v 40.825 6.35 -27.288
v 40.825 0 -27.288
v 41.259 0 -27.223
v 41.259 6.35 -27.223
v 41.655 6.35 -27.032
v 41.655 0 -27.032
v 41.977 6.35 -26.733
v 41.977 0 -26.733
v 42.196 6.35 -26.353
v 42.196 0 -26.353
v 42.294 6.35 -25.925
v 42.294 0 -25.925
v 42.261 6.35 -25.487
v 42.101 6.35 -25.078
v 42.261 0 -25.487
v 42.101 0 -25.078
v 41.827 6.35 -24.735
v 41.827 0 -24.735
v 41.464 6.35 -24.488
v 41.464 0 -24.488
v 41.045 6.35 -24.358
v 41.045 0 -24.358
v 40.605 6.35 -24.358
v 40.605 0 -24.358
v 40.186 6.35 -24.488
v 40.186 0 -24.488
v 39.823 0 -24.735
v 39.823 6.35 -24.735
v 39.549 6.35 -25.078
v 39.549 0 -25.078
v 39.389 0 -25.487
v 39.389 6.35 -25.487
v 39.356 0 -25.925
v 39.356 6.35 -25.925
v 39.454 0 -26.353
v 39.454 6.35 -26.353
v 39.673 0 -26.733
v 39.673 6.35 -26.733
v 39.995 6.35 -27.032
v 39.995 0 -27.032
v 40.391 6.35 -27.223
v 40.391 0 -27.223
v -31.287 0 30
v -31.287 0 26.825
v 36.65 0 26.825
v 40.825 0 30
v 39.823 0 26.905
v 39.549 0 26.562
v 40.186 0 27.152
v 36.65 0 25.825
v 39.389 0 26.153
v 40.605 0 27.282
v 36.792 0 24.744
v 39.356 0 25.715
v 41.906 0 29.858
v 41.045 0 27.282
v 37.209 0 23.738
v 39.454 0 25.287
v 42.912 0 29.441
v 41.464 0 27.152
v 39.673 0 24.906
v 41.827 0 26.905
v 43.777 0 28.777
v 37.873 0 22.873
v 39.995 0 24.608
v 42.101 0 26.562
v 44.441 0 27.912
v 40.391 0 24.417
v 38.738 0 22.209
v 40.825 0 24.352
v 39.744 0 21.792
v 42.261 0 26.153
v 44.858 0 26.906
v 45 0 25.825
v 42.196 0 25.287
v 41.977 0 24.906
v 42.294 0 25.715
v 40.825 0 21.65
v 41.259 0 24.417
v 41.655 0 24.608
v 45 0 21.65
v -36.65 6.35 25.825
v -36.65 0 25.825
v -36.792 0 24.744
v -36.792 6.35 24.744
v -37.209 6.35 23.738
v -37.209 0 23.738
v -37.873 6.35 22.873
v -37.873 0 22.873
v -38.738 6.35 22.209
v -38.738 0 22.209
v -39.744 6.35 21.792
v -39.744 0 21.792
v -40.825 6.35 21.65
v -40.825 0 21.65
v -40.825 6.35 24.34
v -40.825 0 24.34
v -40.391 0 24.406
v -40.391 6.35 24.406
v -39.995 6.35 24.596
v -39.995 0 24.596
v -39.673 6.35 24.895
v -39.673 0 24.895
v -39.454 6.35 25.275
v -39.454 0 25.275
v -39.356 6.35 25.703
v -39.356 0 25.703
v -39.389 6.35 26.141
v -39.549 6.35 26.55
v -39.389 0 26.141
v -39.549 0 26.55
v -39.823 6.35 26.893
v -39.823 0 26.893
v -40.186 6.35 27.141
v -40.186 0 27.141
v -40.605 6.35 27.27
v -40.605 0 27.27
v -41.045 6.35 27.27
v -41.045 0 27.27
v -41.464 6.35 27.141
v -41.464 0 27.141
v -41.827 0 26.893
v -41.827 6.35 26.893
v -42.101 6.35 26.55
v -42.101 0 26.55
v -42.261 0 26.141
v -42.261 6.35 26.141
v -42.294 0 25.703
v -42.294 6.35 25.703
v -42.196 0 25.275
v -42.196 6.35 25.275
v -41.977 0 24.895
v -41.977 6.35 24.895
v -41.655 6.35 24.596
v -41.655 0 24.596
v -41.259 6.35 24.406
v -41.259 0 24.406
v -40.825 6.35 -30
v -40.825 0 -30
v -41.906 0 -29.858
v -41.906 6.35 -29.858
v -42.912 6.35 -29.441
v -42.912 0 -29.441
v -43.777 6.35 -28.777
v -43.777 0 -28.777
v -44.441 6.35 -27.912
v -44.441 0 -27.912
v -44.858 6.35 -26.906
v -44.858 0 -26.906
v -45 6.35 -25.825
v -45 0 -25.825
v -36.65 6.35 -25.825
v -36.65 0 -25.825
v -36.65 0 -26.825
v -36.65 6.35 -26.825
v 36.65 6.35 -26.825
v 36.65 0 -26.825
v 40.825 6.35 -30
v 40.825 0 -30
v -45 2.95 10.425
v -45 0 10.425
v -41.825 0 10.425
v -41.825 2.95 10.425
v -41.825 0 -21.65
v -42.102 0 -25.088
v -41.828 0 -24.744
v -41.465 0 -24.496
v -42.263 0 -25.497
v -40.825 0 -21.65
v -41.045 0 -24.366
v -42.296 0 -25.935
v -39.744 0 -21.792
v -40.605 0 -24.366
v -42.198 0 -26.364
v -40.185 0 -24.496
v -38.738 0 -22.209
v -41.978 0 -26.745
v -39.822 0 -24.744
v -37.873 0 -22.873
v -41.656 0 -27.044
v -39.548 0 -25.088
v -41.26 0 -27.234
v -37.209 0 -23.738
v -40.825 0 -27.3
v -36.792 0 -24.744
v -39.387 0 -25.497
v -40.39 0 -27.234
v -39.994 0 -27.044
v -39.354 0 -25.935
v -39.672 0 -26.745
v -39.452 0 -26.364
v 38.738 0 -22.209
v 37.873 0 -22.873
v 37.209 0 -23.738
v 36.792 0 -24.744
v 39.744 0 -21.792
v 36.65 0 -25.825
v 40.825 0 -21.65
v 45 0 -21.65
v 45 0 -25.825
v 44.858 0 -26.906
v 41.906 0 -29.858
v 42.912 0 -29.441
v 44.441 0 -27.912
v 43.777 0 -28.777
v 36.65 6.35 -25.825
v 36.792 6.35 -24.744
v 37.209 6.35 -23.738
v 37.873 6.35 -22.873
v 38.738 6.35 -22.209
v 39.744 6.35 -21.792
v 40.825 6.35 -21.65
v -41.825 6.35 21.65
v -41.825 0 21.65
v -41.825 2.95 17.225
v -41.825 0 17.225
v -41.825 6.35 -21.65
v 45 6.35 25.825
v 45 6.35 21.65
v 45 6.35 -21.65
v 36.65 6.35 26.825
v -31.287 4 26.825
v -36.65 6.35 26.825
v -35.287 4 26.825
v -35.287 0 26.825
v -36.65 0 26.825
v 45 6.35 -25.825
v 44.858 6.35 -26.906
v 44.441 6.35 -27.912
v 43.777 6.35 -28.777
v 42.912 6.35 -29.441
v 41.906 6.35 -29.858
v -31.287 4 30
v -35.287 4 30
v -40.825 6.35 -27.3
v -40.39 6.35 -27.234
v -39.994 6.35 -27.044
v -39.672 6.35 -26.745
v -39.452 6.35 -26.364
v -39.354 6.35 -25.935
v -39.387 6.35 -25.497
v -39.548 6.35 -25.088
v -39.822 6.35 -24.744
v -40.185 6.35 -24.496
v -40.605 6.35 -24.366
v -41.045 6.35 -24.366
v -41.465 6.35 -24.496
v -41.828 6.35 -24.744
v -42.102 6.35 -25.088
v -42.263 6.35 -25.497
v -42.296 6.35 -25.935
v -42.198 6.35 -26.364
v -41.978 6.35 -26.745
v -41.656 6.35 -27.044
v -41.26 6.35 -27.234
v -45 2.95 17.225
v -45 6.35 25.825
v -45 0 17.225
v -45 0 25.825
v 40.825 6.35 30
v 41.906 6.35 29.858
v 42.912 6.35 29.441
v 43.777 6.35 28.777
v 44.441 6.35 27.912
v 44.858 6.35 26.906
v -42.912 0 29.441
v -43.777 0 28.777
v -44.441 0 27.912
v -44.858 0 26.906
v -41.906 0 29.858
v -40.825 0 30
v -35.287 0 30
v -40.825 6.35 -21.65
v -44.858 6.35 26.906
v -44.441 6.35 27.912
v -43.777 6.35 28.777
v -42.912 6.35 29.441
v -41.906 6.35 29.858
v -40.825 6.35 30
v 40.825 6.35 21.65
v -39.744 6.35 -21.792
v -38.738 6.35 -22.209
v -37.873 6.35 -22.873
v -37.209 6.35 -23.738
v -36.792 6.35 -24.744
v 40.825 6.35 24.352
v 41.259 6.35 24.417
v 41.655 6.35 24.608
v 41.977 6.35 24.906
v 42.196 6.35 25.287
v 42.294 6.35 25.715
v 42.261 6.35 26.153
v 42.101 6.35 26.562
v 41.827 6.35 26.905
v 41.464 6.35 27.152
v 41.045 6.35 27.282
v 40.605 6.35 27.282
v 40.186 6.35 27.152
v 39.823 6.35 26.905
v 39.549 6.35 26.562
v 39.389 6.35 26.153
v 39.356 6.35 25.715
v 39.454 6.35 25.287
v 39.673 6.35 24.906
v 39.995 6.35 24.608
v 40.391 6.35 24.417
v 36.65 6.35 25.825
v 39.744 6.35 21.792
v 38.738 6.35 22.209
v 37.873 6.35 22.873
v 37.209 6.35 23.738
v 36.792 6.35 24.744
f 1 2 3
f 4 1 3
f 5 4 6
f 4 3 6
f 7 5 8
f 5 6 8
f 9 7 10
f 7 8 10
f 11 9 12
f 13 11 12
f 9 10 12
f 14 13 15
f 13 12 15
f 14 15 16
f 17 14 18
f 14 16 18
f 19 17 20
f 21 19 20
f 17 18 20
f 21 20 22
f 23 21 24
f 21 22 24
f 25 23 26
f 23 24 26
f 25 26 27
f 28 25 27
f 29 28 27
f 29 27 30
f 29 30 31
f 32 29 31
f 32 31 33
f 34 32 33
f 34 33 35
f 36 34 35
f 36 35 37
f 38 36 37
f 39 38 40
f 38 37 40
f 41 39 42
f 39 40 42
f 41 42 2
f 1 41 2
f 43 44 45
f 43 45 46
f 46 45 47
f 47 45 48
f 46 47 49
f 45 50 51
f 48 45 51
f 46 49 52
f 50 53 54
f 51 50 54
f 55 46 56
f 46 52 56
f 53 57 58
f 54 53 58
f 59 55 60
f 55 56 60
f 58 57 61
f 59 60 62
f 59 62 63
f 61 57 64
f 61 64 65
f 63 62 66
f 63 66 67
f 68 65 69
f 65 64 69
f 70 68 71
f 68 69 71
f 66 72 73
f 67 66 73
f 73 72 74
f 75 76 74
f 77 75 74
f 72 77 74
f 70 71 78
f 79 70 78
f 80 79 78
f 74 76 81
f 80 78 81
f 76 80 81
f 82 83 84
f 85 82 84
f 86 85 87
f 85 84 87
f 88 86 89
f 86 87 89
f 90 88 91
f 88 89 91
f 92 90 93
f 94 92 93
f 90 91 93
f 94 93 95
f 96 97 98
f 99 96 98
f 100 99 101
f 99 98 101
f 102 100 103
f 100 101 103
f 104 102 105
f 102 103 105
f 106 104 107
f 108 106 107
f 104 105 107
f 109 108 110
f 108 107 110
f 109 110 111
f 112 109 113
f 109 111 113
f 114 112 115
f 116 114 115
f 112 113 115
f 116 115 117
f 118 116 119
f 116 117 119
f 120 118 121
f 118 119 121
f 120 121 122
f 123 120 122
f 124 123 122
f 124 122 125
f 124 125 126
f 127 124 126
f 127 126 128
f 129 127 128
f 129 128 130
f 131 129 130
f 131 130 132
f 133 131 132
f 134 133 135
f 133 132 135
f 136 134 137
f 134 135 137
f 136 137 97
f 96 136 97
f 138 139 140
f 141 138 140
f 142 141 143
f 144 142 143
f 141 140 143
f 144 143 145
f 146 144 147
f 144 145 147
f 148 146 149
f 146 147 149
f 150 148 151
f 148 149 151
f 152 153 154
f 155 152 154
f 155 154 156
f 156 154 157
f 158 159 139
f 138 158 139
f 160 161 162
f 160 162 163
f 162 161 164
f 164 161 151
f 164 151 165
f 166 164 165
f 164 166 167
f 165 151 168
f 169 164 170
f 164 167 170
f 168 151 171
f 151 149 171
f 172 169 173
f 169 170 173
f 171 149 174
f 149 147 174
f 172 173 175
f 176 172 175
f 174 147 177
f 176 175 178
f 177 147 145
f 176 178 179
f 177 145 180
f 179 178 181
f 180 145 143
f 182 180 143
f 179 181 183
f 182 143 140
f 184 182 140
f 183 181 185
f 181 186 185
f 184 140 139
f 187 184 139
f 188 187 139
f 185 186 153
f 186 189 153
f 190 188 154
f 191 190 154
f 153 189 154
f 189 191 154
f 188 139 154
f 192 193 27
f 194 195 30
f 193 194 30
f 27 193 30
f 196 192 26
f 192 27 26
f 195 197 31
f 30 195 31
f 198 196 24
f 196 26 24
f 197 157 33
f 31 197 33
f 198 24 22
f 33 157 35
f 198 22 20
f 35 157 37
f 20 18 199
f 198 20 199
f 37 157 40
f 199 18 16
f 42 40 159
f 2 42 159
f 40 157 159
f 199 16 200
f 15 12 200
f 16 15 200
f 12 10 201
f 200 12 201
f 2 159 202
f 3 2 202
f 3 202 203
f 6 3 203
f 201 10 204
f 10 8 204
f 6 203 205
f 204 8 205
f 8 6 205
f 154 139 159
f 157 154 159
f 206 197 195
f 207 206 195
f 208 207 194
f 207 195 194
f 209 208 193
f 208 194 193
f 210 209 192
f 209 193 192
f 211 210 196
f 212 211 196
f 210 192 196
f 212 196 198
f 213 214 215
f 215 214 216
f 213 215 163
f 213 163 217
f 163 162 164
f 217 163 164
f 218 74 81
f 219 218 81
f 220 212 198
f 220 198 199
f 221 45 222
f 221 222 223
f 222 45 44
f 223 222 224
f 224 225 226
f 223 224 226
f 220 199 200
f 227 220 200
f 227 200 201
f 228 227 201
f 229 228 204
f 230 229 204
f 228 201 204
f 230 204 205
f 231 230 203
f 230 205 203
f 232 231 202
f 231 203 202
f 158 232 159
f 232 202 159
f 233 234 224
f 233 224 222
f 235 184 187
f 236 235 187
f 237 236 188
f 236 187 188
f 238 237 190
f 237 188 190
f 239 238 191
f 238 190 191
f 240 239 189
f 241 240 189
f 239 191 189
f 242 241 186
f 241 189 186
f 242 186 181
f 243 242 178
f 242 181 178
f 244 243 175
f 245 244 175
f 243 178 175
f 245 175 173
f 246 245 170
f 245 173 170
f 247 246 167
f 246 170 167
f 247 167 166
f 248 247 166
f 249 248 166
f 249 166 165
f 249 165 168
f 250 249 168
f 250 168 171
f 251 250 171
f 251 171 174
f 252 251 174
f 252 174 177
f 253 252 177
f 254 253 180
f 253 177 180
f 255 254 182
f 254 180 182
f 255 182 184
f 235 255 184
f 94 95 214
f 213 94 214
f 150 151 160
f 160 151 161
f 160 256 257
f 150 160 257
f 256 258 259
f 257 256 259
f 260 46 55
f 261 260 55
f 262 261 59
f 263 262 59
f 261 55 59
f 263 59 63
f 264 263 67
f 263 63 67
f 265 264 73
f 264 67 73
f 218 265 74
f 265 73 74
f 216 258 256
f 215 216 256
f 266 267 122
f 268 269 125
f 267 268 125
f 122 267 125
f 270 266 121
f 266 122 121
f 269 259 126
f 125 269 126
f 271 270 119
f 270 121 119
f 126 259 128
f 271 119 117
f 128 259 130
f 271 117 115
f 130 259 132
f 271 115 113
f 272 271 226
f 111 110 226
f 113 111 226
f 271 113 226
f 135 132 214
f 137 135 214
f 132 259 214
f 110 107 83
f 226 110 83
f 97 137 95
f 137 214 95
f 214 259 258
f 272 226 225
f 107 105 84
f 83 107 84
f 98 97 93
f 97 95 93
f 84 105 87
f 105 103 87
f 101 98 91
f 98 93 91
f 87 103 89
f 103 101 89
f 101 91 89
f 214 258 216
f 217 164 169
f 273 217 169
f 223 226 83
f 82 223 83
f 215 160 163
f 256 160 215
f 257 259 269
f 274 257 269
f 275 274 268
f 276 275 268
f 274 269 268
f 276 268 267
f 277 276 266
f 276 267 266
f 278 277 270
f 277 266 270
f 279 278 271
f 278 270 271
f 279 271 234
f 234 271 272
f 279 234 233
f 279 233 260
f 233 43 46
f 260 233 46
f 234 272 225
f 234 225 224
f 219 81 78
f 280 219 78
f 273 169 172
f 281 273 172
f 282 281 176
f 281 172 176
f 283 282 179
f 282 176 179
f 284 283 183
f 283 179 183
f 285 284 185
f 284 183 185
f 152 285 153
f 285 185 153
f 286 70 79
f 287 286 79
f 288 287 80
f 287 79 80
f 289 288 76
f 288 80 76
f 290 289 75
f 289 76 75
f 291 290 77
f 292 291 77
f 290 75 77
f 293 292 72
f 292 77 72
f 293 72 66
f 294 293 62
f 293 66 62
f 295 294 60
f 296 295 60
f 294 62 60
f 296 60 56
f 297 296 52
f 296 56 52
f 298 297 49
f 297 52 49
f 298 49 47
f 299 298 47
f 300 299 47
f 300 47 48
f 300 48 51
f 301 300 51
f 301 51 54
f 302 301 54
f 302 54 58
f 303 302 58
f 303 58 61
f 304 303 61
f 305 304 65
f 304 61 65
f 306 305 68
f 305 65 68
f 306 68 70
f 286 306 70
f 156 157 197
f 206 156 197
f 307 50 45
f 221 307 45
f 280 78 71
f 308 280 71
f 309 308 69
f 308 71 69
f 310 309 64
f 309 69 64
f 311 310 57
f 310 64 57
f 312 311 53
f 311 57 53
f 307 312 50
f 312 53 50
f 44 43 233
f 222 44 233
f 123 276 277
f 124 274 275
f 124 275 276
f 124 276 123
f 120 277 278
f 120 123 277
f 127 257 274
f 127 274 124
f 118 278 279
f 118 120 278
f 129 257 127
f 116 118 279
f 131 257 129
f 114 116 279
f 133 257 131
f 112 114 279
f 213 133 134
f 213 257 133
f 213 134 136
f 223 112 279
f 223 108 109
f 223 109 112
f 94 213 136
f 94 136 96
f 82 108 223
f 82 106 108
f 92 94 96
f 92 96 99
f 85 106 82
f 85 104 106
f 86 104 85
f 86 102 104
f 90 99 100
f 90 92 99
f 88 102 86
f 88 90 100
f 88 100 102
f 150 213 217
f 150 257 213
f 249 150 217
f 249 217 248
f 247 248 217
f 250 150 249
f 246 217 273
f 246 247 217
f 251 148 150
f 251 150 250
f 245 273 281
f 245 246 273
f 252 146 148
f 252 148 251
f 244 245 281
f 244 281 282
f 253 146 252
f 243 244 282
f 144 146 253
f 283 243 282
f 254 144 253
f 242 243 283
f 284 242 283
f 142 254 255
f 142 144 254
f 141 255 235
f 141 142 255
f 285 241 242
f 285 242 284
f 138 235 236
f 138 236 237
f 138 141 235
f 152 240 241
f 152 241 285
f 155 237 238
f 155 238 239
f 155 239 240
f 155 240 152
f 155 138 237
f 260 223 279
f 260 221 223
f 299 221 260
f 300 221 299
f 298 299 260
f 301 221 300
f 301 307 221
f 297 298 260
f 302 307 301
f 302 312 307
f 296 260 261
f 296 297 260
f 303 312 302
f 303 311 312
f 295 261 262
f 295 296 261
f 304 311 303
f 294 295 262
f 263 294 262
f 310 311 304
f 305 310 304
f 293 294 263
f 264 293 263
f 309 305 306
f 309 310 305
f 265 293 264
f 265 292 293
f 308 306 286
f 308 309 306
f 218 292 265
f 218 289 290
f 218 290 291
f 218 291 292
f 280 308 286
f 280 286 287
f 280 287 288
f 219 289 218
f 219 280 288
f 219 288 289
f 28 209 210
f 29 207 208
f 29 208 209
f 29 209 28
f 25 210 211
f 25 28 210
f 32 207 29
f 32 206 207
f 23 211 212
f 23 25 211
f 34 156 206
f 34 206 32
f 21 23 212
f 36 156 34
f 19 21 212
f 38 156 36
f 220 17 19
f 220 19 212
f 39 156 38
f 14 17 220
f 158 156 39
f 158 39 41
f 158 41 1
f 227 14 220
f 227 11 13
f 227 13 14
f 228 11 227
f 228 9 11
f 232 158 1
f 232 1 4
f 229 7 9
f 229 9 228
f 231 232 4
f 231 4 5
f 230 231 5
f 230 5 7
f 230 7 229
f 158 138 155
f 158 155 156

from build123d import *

# Parameters (mm, degrees)
BOSS_EXTRUDE3_DEPTH = 6.35
SKETCH5_W           = 6.8
SKETCH5_H           = 5.9
CUT_EXTRUDE3_DEPTH  = 3.175
SKETCH7_R           = 1.475
SKETCH7_R_2         = 1.4732
CUT_EXTRUDE5_DEPTH  = 6.35
SKETCH8_W           = 3.175
SKETCH8_H           = 43.3
CUT_EXTRUDE6_DEPTH  = 10
SKETCH9_W           = 4
SKETCH9_H           = 4
CUT_EXTRUDE8_DEPTH  = 4


with BuildPart() as part:
    # Sketch2 → Boss-Extrude3 (new body)
    with BuildSketch(Plane(origin=(0, 0, 0), x_dir=(1, 0, 0), z_dir=(0, 1, 0))):
        with BuildLine():
            Line((-45, 25.825), (-45, -25.825))
            ThreePointArc((-45, -25.825), (-43.777170811, -28.777170811), (-40.825, -30))
            Line((-40.825, -30), (40.825, -30))
            ThreePointArc((40.825, -30), (43.777170811, -28.777170811), (45, -25.825))
            Line((45, -25.825), (45, 25.825))
            ThreePointArc((45, 25.825), (43.777170811, 28.777170811), (40.825, 30))
            Line((40.825, 30), (-40.825, 30))
            ThreePointArc((-40.825, 30), (-43.777170811, 28.777170811), (-45, 25.825))
        make_face()
        with BuildLine():
            Line((40.825, 21.65), (41.825, 21.65))
            Line((41.825, 21.65), (41.825, -21.65))
            Line((41.825, -21.65), (40.825, -21.65))
            ThreePointArc((40.825, -21.65), (37.872829189, -22.872829189), (36.65, -25.825))
            Line((36.65, -25.825), (36.65, -26.825))
            Line((36.65, -26.825), (-36.65, -26.825))
            Line((-36.65, -26.825), (-36.65, -25.825))
            ThreePointArc((-36.65, -25.825), (-37.872829189, -22.872829189), (-40.825, -21.65))
            Line((-40.825, -21.65), (-41.825, -21.65))
            Line((-41.825, -21.65), (-41.825, 21.65))
            Line((-41.825, 21.65), (-40.825, 21.65))
            ThreePointArc((-40.825, 21.65), (-37.872829189, 22.872829189), (-36.65, 25.825))
            Line((-36.65, 25.825), (-36.65, 26.825))
            Line((-36.65, 26.825), (36.65, 26.825))
            Line((36.65, 26.825), (36.65, 25.825))
            ThreePointArc((36.65, 25.825), (37.872829189, 22.872829189), (40.825, 21.65))
        make_face(mode=Mode.SUBTRACT)
    extrude(amount=BOSS_EXTRUDE3_DEPTH)

    # Sketch5 → Cut-Extrude3 (cut)
    with BuildSketch(Plane.ZY.offset(45)):
        with Locations((13.825, 0)):
            Rectangle(SKETCH5_W, SKETCH5_H)
    extrude(amount=-CUT_EXTRUDE3_DEPTH, mode=Mode.SUBTRACT)

    # Sketch7 → Cut-Extrude5 (cut)
    with BuildSketch(Plane.XZ):
        with Locations(Location((-40.825, -25.825, 0), (0, 0, 270))):
            Circle(SKETCH7_R)
        with Locations(Location((-40.825, 25.81356336, 0), (0, 0, 270))):
            Circle(SKETCH7_R_2)
        with Locations(Location((40.825, 25.825, 0), (0, 0, 270))):
            Circle(SKETCH7_R_2)
        with Locations(Location((40.825, -25.81487963, 0), (0, 0, 270))):
            Circle(SKETCH7_R_2)
    extrude(amount=-CUT_EXTRUDE5_DEPTH, mode=Mode.SUBTRACT)

    # Sketch8 → Cut-Extrude6 (cut)
    with BuildSketch(Plane(origin=(0, 6.35, 0), x_dir=(1, 0, 0), z_dir=(0, 1, 0))):
        with Locations((43.4125, 0)):
            Rectangle(SKETCH8_W, SKETCH8_H)
    extrude(amount=-CUT_EXTRUDE6_DEPTH, mode=Mode.SUBTRACT)

    # Sketch9 → Cut-Extrude8 (cut)
    with BuildSketch(Plane.XY.offset(30)):
        with Locations((-33.2866, 2)):
            Rectangle(SKETCH9_W, SKETCH9_H)
    extrude(amount=-CUT_EXTRUDE8_DEPTH, mode=Mode.SUBTRACT)


solid = part.part
